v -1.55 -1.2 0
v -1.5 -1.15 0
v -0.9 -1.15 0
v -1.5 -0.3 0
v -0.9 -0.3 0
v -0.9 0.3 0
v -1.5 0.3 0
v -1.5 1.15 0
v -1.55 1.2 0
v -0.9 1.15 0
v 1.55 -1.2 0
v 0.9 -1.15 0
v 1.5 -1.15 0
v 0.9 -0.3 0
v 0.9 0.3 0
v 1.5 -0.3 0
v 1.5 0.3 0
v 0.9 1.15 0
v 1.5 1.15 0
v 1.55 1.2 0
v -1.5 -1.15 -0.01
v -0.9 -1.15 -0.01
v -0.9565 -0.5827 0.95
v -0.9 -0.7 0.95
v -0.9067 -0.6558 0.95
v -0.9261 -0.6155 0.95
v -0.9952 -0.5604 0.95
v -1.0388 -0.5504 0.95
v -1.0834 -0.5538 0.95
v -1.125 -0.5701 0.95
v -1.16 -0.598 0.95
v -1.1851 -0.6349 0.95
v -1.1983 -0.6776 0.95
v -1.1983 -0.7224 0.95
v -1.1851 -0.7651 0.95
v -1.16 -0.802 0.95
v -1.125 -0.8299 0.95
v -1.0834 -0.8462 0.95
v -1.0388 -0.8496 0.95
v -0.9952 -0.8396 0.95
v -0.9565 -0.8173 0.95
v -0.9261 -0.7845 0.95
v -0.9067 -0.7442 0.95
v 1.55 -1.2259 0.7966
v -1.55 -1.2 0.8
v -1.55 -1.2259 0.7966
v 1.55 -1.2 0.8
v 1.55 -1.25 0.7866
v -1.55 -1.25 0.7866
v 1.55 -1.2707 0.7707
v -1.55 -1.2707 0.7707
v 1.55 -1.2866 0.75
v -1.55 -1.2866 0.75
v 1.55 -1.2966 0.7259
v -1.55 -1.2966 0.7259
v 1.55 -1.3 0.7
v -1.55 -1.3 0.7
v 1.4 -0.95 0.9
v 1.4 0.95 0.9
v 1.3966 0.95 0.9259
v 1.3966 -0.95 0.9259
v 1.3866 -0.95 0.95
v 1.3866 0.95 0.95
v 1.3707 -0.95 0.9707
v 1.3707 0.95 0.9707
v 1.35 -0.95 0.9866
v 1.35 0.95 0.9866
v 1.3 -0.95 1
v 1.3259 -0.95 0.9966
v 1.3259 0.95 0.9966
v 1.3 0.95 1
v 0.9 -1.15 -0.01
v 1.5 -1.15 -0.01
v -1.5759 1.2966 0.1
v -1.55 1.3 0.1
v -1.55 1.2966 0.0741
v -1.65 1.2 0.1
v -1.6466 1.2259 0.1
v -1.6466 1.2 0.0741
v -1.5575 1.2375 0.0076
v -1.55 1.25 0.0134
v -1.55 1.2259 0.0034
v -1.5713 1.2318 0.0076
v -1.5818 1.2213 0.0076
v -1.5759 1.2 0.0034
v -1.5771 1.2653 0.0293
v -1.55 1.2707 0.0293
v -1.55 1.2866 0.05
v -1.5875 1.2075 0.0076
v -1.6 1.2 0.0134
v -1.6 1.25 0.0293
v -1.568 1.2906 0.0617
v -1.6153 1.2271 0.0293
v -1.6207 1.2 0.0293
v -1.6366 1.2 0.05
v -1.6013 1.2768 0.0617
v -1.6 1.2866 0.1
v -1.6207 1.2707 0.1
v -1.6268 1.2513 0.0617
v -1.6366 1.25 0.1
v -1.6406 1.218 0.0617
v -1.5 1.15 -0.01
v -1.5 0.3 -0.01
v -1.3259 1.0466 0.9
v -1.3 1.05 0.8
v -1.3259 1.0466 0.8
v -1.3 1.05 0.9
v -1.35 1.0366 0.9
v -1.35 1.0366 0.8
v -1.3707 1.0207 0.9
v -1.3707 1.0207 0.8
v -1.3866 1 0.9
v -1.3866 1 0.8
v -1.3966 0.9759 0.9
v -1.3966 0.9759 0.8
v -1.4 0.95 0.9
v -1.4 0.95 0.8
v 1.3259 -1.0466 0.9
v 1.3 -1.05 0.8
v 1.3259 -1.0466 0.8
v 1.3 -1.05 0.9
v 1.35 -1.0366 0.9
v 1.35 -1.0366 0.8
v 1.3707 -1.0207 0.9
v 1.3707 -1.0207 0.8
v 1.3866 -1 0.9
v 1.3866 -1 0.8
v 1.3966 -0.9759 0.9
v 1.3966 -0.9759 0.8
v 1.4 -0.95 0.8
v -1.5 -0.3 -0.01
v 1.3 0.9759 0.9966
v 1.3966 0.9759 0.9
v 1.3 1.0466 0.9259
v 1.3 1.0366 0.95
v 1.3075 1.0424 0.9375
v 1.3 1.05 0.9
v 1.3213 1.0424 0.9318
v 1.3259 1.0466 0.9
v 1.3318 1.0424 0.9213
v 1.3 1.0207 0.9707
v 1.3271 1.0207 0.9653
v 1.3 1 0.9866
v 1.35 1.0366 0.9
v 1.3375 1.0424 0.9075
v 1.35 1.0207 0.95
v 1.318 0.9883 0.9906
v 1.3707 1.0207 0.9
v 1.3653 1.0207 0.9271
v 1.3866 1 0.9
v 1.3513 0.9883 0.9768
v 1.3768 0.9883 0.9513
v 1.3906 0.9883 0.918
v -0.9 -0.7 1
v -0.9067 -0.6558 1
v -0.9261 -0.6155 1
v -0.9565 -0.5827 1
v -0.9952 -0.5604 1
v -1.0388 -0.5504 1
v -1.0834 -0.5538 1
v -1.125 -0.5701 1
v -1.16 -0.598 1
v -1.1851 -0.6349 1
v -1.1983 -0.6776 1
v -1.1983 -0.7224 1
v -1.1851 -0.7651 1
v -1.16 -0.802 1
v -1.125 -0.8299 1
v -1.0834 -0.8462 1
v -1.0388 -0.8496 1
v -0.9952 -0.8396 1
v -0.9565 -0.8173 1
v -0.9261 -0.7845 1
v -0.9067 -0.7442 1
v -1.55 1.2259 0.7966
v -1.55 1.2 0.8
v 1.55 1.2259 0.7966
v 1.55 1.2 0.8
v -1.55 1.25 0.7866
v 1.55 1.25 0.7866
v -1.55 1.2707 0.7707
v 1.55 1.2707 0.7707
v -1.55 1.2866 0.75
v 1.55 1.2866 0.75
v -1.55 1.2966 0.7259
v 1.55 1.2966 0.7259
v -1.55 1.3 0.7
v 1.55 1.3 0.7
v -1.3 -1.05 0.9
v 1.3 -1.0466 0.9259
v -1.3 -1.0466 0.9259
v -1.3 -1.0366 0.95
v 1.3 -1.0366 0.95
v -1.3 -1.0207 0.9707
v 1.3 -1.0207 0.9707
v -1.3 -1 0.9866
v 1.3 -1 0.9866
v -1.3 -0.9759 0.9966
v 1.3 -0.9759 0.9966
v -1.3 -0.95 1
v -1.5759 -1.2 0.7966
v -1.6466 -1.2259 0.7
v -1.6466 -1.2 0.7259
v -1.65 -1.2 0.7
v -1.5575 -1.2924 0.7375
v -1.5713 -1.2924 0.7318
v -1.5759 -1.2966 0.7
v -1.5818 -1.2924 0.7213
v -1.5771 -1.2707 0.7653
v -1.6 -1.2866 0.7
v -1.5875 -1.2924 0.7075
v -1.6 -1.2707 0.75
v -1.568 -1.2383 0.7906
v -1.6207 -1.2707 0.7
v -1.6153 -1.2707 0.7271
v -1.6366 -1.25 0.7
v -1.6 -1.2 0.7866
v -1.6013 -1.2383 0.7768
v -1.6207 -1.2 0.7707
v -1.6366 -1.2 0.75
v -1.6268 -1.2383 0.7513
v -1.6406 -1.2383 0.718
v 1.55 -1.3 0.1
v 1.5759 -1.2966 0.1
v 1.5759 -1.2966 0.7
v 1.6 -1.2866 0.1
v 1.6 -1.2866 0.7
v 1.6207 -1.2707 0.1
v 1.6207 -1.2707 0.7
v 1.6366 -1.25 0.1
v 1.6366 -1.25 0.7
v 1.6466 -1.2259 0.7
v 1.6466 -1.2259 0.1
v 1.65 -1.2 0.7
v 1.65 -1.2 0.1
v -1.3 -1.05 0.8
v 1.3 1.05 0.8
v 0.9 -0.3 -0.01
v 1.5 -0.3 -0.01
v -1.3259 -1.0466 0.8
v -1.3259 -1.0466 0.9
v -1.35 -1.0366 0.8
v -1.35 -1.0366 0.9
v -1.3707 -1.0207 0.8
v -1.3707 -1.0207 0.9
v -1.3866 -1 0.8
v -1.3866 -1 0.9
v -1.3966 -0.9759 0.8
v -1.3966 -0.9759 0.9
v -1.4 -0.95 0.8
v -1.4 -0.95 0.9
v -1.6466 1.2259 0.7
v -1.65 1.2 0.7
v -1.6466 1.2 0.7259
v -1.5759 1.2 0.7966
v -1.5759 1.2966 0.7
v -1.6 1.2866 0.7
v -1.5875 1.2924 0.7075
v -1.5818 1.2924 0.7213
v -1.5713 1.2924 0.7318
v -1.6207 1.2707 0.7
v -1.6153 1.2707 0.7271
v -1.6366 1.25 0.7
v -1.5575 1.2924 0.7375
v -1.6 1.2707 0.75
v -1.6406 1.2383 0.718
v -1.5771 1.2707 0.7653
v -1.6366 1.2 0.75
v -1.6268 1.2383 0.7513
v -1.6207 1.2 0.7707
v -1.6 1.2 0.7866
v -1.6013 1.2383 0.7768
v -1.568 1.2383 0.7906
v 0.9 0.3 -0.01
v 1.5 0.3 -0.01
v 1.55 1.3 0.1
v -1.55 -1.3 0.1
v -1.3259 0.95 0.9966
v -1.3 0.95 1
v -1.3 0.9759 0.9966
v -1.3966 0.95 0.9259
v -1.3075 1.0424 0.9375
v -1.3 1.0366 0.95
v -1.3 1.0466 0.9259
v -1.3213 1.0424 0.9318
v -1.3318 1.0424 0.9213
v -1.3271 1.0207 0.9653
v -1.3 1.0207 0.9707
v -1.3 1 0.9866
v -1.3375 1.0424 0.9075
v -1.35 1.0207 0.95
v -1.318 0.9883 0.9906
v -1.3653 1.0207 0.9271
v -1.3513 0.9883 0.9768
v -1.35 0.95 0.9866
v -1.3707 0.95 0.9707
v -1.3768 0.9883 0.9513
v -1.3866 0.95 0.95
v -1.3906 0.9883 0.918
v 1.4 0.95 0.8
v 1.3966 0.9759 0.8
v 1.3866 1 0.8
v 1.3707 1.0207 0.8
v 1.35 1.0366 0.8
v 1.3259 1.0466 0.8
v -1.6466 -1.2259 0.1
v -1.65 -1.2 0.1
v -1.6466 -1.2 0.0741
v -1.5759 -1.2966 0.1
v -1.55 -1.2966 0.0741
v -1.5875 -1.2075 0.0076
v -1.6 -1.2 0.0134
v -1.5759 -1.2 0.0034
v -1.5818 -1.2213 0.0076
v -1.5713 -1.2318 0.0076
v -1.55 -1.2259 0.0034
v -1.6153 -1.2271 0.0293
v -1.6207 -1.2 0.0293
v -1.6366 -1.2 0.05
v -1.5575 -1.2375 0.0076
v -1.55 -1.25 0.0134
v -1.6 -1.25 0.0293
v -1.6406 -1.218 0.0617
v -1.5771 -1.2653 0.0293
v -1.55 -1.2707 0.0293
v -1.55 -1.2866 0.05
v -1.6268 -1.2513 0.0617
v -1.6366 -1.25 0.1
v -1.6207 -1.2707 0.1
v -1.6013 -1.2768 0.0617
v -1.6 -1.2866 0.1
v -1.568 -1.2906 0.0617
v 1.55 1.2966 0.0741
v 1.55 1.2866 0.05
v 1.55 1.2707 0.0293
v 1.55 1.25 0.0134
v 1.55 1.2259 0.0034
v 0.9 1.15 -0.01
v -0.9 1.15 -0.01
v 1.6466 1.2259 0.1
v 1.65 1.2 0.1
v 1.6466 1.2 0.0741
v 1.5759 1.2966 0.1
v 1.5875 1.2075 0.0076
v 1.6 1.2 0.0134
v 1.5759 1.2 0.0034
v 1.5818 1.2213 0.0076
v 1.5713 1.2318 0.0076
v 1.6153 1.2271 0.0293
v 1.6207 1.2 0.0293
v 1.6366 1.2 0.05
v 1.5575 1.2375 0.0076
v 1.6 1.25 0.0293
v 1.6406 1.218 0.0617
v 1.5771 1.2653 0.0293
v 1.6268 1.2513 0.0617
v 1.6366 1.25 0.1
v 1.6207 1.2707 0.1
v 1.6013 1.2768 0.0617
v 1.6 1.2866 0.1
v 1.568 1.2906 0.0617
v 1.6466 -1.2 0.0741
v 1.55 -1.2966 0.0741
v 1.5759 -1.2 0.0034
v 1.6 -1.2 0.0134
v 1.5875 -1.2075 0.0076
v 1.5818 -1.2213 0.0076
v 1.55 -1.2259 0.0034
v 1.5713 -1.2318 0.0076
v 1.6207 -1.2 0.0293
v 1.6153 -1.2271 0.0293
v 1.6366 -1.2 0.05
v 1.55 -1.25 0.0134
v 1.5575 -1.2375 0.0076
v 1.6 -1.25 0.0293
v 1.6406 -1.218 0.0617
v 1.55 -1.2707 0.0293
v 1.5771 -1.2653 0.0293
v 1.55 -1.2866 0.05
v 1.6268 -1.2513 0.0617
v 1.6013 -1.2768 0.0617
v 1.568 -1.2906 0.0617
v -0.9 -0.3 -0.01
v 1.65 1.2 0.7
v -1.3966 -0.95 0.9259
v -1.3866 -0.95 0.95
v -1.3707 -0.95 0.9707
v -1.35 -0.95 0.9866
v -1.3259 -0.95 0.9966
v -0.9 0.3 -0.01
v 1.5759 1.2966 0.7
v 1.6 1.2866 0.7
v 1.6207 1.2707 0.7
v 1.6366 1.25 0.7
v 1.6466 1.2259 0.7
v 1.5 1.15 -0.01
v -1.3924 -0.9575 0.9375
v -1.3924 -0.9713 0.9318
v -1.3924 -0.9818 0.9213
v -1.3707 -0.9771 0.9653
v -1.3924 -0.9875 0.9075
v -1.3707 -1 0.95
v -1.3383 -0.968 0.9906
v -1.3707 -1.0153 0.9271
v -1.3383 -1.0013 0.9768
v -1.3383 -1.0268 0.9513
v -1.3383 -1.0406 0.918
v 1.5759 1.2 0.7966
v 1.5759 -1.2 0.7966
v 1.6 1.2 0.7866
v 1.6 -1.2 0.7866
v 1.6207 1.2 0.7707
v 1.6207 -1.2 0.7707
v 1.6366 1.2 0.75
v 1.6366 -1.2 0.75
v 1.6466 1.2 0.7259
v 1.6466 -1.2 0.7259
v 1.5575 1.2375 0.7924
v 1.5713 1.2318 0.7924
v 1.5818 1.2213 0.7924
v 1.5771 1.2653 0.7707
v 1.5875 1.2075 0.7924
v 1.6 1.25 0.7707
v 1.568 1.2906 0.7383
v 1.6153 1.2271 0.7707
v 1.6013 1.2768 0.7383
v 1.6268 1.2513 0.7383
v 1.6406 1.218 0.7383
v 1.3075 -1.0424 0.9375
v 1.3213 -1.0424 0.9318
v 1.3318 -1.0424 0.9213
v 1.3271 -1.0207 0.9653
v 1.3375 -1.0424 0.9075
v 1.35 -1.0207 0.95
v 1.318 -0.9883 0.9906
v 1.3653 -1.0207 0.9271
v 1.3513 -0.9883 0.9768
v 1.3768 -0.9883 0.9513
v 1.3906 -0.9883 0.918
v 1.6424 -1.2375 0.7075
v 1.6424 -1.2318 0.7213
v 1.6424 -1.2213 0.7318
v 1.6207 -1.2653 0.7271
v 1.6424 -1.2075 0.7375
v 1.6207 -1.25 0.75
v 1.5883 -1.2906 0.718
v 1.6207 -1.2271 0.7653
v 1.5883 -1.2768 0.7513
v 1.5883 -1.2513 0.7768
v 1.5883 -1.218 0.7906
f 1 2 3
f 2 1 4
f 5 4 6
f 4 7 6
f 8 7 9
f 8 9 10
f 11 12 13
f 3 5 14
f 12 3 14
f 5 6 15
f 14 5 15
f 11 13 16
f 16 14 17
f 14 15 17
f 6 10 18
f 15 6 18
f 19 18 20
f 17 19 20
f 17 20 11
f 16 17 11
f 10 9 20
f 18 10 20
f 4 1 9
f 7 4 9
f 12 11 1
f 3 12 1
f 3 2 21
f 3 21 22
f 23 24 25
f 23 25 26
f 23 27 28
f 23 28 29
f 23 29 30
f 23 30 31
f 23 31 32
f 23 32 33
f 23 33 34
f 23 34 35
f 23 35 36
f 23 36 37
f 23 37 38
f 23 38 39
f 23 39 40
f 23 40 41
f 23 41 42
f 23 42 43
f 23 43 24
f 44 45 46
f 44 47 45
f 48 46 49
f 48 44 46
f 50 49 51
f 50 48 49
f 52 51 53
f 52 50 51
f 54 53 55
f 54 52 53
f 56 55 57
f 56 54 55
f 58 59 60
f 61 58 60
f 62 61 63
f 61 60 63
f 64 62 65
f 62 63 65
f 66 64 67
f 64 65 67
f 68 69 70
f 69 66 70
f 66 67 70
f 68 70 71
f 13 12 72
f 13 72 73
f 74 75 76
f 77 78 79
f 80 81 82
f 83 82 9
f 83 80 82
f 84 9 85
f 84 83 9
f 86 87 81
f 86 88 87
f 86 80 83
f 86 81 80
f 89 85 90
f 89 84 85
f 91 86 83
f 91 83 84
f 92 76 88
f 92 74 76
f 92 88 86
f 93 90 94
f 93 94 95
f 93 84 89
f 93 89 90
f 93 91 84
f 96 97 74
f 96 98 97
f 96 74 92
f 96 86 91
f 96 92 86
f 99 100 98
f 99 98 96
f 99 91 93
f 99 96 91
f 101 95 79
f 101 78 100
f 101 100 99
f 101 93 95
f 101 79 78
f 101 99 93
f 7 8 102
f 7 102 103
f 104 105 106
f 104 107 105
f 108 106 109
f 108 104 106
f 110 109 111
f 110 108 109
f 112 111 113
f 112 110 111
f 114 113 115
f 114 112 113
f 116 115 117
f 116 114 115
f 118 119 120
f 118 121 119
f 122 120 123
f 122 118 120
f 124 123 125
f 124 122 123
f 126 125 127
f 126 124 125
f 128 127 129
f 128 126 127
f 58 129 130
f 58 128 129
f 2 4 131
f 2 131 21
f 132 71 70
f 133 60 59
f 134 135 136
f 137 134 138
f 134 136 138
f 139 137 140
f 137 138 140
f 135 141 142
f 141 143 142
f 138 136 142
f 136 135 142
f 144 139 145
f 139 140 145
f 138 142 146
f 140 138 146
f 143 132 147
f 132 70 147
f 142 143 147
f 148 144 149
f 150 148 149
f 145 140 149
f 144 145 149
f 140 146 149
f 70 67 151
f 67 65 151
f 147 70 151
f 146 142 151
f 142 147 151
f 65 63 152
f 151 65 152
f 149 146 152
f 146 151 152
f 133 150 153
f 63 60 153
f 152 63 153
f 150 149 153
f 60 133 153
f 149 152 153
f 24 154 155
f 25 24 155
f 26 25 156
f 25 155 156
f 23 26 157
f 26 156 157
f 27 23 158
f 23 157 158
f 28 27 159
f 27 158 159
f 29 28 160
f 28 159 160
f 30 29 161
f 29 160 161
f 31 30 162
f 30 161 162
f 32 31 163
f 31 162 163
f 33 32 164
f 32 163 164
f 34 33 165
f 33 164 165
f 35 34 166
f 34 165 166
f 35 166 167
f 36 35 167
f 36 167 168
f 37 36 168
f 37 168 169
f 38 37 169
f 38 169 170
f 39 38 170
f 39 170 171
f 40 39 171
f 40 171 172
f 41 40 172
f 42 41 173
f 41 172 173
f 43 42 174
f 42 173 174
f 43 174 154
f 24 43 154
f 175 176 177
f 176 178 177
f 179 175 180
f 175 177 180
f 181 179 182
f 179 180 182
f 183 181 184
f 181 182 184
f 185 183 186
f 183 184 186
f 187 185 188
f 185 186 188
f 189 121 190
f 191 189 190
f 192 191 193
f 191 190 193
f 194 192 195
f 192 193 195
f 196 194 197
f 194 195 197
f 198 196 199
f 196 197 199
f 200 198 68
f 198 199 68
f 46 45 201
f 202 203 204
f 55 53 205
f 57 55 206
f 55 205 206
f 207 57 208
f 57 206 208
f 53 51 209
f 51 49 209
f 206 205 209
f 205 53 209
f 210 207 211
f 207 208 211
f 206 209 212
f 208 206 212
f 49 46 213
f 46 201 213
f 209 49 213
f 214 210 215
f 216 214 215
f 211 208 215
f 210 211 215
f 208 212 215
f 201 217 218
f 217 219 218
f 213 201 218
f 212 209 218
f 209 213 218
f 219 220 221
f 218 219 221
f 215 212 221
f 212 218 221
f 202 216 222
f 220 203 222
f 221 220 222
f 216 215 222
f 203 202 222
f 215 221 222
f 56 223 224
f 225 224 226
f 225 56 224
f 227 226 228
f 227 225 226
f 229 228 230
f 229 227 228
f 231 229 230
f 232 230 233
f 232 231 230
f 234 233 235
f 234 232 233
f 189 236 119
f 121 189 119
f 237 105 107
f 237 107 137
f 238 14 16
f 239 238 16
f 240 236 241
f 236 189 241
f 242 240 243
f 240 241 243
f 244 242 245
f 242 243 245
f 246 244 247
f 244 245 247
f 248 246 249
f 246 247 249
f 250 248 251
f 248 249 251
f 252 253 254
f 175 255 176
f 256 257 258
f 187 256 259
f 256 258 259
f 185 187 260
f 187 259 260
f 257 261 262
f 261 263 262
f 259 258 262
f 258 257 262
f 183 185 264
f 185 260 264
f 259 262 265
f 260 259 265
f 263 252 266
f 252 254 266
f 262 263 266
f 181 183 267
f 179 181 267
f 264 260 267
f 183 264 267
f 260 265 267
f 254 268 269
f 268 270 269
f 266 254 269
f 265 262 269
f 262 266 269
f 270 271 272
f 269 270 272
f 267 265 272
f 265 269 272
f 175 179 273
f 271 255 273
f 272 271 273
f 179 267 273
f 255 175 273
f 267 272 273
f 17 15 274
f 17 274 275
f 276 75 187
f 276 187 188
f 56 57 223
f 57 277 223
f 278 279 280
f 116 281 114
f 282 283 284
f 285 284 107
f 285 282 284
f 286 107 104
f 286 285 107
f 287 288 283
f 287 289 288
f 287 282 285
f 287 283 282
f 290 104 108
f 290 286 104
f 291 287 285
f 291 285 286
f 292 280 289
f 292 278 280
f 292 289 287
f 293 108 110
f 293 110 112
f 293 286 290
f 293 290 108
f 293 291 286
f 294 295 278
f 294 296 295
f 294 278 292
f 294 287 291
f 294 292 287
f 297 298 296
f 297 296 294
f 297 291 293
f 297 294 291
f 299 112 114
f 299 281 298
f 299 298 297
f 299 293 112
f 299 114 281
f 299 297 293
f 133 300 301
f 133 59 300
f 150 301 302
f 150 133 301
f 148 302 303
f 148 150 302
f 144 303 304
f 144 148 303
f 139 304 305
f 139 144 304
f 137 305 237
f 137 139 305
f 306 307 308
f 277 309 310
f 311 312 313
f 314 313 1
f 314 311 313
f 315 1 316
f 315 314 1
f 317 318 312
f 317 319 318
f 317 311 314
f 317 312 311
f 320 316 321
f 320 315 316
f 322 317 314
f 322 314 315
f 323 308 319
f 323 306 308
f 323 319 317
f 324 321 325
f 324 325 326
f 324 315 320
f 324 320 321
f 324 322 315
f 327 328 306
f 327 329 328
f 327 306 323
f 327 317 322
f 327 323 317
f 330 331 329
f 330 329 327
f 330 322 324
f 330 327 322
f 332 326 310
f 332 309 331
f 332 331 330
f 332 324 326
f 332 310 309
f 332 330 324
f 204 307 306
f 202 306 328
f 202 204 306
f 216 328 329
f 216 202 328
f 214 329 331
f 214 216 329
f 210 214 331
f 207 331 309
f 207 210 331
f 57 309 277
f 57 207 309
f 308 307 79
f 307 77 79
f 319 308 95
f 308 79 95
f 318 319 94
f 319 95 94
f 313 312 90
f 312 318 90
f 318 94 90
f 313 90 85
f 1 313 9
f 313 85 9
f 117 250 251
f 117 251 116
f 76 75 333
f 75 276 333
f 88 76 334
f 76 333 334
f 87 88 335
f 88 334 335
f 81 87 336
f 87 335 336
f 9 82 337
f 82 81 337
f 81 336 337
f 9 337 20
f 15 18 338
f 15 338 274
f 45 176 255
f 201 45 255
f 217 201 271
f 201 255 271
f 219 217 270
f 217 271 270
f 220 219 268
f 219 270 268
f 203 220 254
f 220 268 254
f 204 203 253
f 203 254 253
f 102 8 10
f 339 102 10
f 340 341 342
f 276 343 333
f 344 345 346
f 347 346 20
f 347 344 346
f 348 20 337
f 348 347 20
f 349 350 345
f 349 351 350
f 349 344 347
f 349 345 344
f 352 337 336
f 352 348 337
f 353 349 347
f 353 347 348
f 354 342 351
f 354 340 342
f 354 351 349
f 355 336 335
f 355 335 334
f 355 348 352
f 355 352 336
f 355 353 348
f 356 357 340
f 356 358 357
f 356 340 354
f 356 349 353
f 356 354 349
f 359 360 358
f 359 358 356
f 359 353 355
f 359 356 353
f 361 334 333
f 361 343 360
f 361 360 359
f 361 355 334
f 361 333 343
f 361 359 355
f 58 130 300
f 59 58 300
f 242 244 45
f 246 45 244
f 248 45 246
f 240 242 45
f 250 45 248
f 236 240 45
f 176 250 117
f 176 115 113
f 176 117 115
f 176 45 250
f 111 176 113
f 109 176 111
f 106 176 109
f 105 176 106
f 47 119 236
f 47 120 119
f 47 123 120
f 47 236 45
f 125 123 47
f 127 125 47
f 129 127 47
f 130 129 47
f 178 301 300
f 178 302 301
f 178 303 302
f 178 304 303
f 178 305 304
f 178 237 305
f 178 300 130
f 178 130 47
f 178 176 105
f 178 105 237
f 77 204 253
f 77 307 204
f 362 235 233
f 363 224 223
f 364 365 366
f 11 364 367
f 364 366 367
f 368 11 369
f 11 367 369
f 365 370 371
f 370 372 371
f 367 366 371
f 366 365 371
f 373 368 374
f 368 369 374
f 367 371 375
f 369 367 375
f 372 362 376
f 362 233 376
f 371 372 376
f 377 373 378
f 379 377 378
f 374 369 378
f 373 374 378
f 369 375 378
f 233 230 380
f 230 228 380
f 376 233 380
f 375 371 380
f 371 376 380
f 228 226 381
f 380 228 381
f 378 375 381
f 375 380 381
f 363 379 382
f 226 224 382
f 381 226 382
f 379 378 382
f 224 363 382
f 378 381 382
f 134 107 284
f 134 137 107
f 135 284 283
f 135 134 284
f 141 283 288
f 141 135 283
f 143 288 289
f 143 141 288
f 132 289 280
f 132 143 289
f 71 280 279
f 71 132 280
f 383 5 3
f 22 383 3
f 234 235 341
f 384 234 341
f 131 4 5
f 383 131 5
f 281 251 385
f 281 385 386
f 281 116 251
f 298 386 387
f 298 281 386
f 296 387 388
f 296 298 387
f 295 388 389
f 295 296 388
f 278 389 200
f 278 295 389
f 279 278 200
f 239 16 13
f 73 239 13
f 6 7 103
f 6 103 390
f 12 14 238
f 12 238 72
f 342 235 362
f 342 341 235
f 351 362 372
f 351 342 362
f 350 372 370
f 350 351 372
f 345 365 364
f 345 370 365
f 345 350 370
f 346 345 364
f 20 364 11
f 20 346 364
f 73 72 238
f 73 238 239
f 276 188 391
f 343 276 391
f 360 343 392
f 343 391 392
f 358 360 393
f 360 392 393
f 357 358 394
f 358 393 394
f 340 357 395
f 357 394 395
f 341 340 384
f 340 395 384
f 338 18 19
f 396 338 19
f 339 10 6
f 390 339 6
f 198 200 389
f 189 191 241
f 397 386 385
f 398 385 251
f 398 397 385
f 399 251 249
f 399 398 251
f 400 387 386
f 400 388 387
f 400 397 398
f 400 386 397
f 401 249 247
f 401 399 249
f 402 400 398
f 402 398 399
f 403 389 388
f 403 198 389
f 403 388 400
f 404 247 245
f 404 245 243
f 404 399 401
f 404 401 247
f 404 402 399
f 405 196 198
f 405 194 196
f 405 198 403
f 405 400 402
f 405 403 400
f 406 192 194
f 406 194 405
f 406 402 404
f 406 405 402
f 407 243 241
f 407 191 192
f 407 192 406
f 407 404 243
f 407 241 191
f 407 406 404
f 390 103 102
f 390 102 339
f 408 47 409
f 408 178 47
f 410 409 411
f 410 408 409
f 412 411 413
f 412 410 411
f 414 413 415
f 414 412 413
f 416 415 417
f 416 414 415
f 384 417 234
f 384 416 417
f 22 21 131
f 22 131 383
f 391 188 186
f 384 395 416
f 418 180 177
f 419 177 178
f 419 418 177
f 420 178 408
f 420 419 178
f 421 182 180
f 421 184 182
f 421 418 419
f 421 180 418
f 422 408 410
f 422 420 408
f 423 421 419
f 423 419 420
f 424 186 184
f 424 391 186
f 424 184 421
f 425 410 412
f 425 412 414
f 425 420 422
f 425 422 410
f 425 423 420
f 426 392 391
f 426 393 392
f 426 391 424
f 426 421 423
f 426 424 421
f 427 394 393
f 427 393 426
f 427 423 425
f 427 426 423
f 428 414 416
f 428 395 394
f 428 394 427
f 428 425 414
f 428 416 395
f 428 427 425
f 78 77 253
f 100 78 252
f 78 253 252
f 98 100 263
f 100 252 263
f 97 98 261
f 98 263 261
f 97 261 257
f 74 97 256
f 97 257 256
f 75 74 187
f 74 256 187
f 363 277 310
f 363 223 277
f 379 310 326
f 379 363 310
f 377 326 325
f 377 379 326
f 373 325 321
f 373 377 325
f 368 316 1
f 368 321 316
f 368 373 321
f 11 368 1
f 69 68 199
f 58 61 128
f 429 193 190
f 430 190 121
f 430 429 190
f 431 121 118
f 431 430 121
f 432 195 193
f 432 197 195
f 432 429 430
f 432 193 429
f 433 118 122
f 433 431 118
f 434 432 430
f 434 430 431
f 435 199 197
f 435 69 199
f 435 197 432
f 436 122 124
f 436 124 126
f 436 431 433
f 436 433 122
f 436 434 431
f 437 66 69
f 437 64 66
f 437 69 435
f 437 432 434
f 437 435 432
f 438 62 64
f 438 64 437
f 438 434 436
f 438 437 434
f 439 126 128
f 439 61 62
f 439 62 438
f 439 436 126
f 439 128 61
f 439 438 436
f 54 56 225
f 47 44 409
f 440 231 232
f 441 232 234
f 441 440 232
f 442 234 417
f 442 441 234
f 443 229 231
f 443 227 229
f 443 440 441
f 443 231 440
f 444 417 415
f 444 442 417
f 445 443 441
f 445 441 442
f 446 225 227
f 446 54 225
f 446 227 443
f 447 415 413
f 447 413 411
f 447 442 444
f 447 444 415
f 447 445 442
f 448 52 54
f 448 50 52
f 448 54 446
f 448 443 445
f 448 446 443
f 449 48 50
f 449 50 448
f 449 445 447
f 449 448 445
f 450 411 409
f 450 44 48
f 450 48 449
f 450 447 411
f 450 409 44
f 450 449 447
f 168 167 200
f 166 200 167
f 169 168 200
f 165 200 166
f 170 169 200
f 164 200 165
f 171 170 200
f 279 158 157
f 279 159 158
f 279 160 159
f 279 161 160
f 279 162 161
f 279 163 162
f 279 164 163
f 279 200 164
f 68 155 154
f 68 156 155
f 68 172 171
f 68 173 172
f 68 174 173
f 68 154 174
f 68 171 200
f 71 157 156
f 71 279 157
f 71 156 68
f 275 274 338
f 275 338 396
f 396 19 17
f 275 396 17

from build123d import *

# Parameters (mm, degrees)
SKETCH_W     = 3.3
SKETCH_H     = 2.6
PAD_DEPTH    = 0.8
SKETCH001_W  = 2.8
SKETCH001_H  = 2.1
PAD001_DEPTH = 0.2
FILLET_R     = 0.1
FILLET001_R  = 0.1
SKETCH002_R  = 0.15
POCKET_DEPTH = 0.05
SKETCH003_W  = 0.6
SKETCH003_H  = 0.85
PAD002_DEPTH = 0.01


with BuildPart() as part:
    # Sketch → Pad (new body)
    with BuildSketch(Plane.XY):
        Rectangle(SKETCH_W, SKETCH_H)
    extrude(amount=PAD_DEPTH)

    # Sketch001 → Pad001 (new body)
    with BuildSketch(Plane.XY.offset(0.8)):
        Rectangle(SKETCH001_W, SKETCH001_H)
    extrude(amount=PAD001_DEPTH)

    # Fillet
    fillet_edges = [part.edges().sort_by_distance(p)[0] for p in [
        (1.4, 0, 1),
        (0, -1.05, 1),
        (-1.4, 0, 1),
        (0, 1.05, 1),
        (1.4, 1.05, 0.9),
        (1.4, -1.05, 0.9),
        (-1.4, -1.05, 0.9),
        (-1.4, 1.05, 0.9),
    ]]
    fillet(fillet_edges, radius=FILLET_R)

    # Fillet001
    fillet001_edges = [part.edges().sort_by_distance(p)[0] for p in [
        (-1.65, 0, 0.8),
        (0, -1.3, 0.8),
        (-1.65, -1.3, 0.4),
        (1.65, -1.3, 0.4),
        (1.65, 1.3, 0.4),
        (-1.65, 1.3, 0.4),
        (0, 1.3, 0.8),
        (1.65, 0, 0.8),
        (1.65, 0, 0),
        (0, 1.3, 0),
        (-1.65, 0, 0),
        (0, -1.3, 0),
    ]]
    fillet(fillet001_edges, radius=FILLET001_R)

    # Sketch002 → Pocket (cut)
    with BuildSketch(Plane.XY.offset(1)):
        with Locations((-1.05, -0.7)):
            Circle(SKETCH002_R)
    extrude(amount=-POCKET_DEPTH, mode=Mode.SUBTRACT)

    # Sketch003 → Pad002 (new body)
    with BuildSketch(Plane(origin=(0, 0, 0), x_dir=(1, 0, 0), z_dir=(0, 0, -1))):
        with Locations((1.2, 0.725)):
            Rectangle(SKETCH003_W, SKETCH003_H)
        with Locations((1.2, -0.725)):
            Rectangle(SKETCH003_W, SKETCH003_H)
        with Locations((-1.2, -0.725)):
            Rectangle(SKETCH003_W, SKETCH003_H)
        with Locations((-1.2, 0.725)):
            Rectangle(SKETCH003_W, SKETCH003_H)
    extrude(amount=PAD002_DEPTH)


solid = part.part
